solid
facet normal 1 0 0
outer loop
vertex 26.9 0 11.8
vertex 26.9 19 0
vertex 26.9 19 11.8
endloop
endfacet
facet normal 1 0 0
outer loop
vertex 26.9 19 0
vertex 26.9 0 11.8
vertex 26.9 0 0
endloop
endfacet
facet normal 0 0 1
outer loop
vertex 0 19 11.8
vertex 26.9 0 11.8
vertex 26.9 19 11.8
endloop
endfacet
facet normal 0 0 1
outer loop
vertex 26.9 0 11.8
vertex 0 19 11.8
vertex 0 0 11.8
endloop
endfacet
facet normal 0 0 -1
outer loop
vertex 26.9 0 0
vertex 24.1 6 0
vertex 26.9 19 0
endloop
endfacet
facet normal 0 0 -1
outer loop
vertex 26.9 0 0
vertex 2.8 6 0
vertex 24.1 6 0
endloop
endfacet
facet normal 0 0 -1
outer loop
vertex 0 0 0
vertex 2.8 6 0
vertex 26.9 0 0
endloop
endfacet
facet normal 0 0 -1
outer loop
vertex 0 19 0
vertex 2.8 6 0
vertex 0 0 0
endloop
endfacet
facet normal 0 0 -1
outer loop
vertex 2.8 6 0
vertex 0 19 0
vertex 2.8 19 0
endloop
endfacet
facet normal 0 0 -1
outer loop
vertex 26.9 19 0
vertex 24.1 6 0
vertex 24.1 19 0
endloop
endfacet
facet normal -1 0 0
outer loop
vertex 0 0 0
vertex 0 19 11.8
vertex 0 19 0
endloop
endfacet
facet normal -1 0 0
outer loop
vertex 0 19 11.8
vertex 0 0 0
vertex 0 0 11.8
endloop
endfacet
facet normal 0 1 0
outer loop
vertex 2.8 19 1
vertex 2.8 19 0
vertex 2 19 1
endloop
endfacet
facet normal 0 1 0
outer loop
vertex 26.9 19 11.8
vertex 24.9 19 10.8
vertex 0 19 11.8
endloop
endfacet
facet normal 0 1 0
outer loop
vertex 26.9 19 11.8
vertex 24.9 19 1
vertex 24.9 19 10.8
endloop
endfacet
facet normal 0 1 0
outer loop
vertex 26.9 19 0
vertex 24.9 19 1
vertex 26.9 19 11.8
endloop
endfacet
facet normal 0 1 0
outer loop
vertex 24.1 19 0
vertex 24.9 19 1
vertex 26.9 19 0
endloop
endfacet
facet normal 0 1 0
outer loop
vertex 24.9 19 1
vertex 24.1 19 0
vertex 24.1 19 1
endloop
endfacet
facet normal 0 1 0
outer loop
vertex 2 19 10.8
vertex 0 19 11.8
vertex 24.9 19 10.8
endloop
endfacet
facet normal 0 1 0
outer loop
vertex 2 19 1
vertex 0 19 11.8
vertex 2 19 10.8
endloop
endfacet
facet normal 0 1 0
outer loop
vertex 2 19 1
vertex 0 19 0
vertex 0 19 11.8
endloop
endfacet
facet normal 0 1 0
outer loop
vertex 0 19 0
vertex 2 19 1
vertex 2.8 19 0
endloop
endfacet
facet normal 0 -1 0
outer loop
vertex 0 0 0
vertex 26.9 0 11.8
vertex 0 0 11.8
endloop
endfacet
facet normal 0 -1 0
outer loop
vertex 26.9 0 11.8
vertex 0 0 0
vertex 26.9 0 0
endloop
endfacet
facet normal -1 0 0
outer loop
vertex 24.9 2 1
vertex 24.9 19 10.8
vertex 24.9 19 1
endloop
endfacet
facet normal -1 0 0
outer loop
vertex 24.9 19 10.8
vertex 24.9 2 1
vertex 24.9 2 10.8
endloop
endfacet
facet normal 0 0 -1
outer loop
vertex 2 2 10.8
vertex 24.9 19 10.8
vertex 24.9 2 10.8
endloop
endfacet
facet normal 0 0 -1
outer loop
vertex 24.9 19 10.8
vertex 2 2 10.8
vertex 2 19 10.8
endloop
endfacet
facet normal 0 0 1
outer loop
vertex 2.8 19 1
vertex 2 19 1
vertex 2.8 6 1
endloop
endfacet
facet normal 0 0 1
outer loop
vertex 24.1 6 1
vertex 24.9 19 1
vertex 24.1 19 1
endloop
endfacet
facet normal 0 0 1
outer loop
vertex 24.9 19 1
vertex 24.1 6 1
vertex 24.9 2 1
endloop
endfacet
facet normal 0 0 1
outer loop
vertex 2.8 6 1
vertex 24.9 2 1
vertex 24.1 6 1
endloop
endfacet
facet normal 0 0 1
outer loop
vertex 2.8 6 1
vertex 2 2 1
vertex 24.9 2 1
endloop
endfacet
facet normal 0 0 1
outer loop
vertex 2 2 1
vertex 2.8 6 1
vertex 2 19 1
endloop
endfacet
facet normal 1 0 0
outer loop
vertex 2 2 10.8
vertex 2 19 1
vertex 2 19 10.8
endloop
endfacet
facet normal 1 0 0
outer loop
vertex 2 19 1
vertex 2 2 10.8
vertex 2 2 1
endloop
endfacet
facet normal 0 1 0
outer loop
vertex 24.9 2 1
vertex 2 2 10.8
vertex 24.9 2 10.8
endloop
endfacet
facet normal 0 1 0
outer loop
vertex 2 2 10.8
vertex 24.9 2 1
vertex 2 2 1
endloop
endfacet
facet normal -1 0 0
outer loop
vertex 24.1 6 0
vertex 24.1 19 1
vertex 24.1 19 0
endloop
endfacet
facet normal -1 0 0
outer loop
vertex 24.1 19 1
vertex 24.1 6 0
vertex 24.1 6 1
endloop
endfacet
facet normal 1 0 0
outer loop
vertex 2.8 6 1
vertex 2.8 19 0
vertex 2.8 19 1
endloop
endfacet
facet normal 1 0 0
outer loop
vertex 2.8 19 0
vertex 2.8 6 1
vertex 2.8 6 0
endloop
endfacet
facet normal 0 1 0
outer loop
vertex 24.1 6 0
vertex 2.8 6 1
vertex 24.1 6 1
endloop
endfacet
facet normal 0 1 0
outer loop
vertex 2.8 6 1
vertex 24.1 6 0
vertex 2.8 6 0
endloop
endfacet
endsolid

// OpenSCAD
// file: pcb-model-sizes.scad
pcbSmtLvSize=[65.94, 33.75];
pcbDevkitcRelaySize=[57.53, 31.88];
pcbCurrentSensorSize=[43.5, 35];
pcbCurrentSensorMiniSize=[39, 35];
pcbCurrentSensorMiniPadDepth=15;
pcbContactorPsuSize=[44.1, 24.4];
pcbContactorInterfaceRelaySize=[41.3,34.8];

pcbRelayHeight = 18.5;
pcbTallCompoent = 15;
pcbShortComponent = 6;

pcbThickness = 1.6;
solderThickness = 3;
wallThickness = 1.5;
partitionThickness = 0.8;

caseMargin = 0.2;
// file: relay-current-enclosure.scad
include <pcb-model-sizes.scad>

currentTopStands=[6, 28];
currentBottomStands = [7, 27];
relayTopStands=[9, 42];
relayBottomStands = [12, 41];
standSize = 2;

module relayCurrentCase(legHeight=5) {
    maxY = max(pcbCurrentSensorSize[1], pcbDevkitcRelaySize[1]);
    sizeX = 2 * wallThickness + partitionThickness + pcbDevkitcRelaySize[0] + pcbCurrentSensorSize[0];
    relayYOffset = (maxY - pcbDevkitcRelaySize[1]) / 2;
    difference() {
        cube([sizeX, 2 * wallThickness + maxY, wallThickness + pcbThickness + solderThickness]);
        translate([wallThickness - caseMargin, wallThickness + relayYOffset - caseMargin, wallThickness]) {
            cube([pcbDevkitcRelaySize[0] + 2 * caseMargin, pcbDevkitcRelaySize[1] + 2 * caseMargin, pcbThickness + solderThickness + 0.01]);
        }
        translate([wallThickness + pcbDevkitcRelaySize[0] + partitionThickness, wallThickness + (maxY - pcbCurrentSensorSize[1]) / 2, wallThickness]) {
            cube([pcbCurrentSensorSize[0], pcbCurrentSensorSize[1], pcbThickness + solderThickness + 0.01]);
        }
    }
    translate([wallThickness,wallThickness + relayYOffset,wallThickness]) {
        for(stand = relayBottomStands) {
            translate([stand, 0, 0]){
               cube([standSize, standSize, solderThickness]);
            }
        }
    }

    translate([wallThickness,wallThickness + relayYOffset + pcbDevkitcRelaySize[1] - standSize,wallThickness]) {
        for(stand = relayTopStands) {
            translate([stand, 0, 0]){
               cube([standSize, standSize, solderThickness]);
            }
        }
    }

    translate([wallThickness + pcbDevkitcRelaySize[0] + partitionThickness,wallThickness,wallThickness]) {
        for(stand = currentBottomStands) {
            translate([stand, 0, 0]){
               cube([standSize, standSize, solderThickness]);
            }
        }
    }

    translate([wallThickness + pcbDevkitcRelaySize[0] + partitionThickness,wallThickness + pcbCurrentSensorSize[1] - standSize,wallThickness]) {
        for(stand = currentTopStands) {
            translate([stand, 0, 0]){
               cube([standSize, standSize, solderThickness]);
            }
        }
    }

    translate([0, 0, wallThickness + pcbThickness + solderThickness - 0.01]) {
        translate([wallThickness + caseMargin, 0, 0]) {
            cube([1 * wallThickness, wallThickness, 2 * wallThickness]);
        }

        translate([sizeX - wallThickness - caseMargin - 1 * wallThickness, 0, 0]) {
            cube([1 * wallThickness, wallThickness, 2 * wallThickness]);
        }

        translate([wallThickness + caseMargin, maxY + wallThickness, 0]) {
            cube([2 * wallThickness, wallThickness, 2 * wallThickness]);
        }

        translate([sizeX - wallThickness - caseMargin - 2 * wallThickness, maxY + wallThickness, 0]) {
            cube([2 * wallThickness, wallThickness, 2 * wallThickness]);
        }
    }

    if (legHeight > 0) {
        translate([0,0,-legHeight + 0.01]) {
            cube([10 * wallThickness, 2 * wallThickness + maxY, legHeight]);
        }
        translate([sizeX - 10 * wallThickness, 0, -legHeight + 0.01]) {
            cube([10 * wallThickness, 2 * wallThickness + maxY, legHeight]);
        }
    }
}

module relayCurrentCaseTop() {
    maxY = max(pcbCurrentSensorSize[1], pcbDevkitcRelaySize[1]);
    trayHeight = wallThickness + pcbThickness + solderThickness;

    difference() {
        cube([2 * wallThickness + partitionThickness + pcbDevkitcRelaySize[0] + pcbCurrentSensorSize[0], 4 * wallThickness + maxY, wallThickness + pcbThickness + solderThickness + pcbRelayHeight + wallThickness]);
        translate([-0.01, wallThickness - caseMargin, -0.01]) {
            cube([2 * wallThickness + partitionThickness + pcbDevkitcRelaySize[0] + pcbCurrentSensorSize[0] + 0.02, 2 * wallThickness + maxY + 2 * caseMargin, wallThickness + pcbThickness + solderThickness]);
        }
        translate([wallThickness -0.01, wallThickness, wallThickness + pcbThickness + solderThickness - 0.01]) {
            cube([partitionThickness + pcbDevkitcRelaySize[0] + pcbCurrentSensorSize[0] + 0.02, 2 * wallThickness + maxY, pcbRelayHeight + 0.01]);
        }
        for(hole=[[6,6], [33, 6], [51, 6], [pcbDevkitcRelaySize[0] + partitionThickness + 15.5, 6], [pcbDevkitcRelaySize[0] + partitionThickness + 39, 6]]) {
            translate([wallThickness + hole[0] - hole[1] / 2, - 0.01, 0]) {
                cube([hole[1], wallThickness + 0.02, trayHeight + hole[1]]);
            }
        }
        for(hole=[[16,6], [46, 4], [pcbDevkitcRelaySize[0] + partitionThickness + 28.5, 6]]) {
            translate([wallThickness + hole[0] - hole[1] / 2, 3 * wallThickness + maxY - 0.01, 0]) {
                cube([hole[1], wallThickness + 0.02, trayHeight + hole[1]]);
            }
        }
    }
}

module smtLvSled() {
    maxY = max(pcbCurrentSensorSize[1], pcbDevkitcRelaySize[1]);

    offsetY = maxY + (2 * wallThickness) - (pcbSmtLvSize[1] + 2 * wallThickness);

    difference() {
        union() {
            translate([0, 0, 0]) {
                cube([pcbSmtLvSize[0] + 2 * wallThickness, pcbSmtLvSize[1] + 2 * wallThickness, wallThickness + pcbTallCompoent + pcbThickness]);
            }
        }
        translate([wallThickness, 1 * wallThickness, wallThickness]) {
            cube([pcbSmtLvSize[0], pcbSmtLvSize[1] + 0 * wallThickness + 0.01, pcbTallCompoent + pcbThickness + 0.01]);
        }

        translate([wallThickness, wallThickness, pcbTallCompoent / 2]) {
            cube([pcbSmtLvSize[0], pcbSmtLvSize[1] + wallThickness + 0.01, pcbTallCompoent / 2 + pcbThickness + wallThickness + 0.01]);
        }
    }
    translate([pcbSmtLvSize[0] / 4 - wallThickness, wallThickness, wallThickness]) {
        cube([wallThickness * 2, wallThickness * 3, pcbTallCompoent]);
    }
    translate([ 3 * pcbSmtLvSize[0] / 4 - wallThickness, wallThickness, wallThickness]) {
        cube([wallThickness * 2, wallThickness * 3, pcbTallCompoent]);
    }

    translate([pcbSmtLvSize[0] / 4 - wallThickness, wallThickness, wallThickness]) {
        cube([wallThickness * 2, wallThickness * 3, pcbTallCompoent]);
    }
    translate([ 3 * pcbSmtLvSize[0] / 4 - wallThickness, wallThickness, wallThickness]) {
        cube([wallThickness * 2, wallThickness * 3, pcbTallCompoent]);
    }

    translate([pcbSmtLvSize[0] / 4 - wallThickness, wallThickness + pcbSmtLvSize[1] - wallThickness * 1, wallThickness]) {
        #cube([wallThickness * 2, wallThickness * 2, pcbTallCompoent]);
    }

    translate([3 * pcbSmtLvSize[0] / 4 - wallThickness, wallThickness + pcbSmtLvSize[1] - wallThickness * 1, wallThickness]) {
        #cube([wallThickness * 2, wallThickness * 2, pcbTallCompoent]);
    }

    translate([0, -offsetY - 1.4, 0]) {
        cube([pcbSmtLvSize[0] + 2 * wallThickness, maxY + 4 * wallThickness + 2.8, wallThickness]);
    }

    translate([0, -offsetY - 1.4 - wallThickness, -3 * wallThickness]) {
        cube([pcbSmtLvSize[0] + 2 * wallThickness, wallThickness, 4 * wallThickness]);
    }

    translate([0, maxY + 3 * wallThickness + 1.4, -3 * wallThickness]) {
        cube([pcbSmtLvSize[0] + 2 * wallThickness, wallThickness, 4 * wallThickness]);
    }

}

relayCurrentCase();


translate([0, -wallThickness, wallThickness + pcbThickness + solderThickness + 2]) {
    relayCurrentCaseTop();
}

translate([0, 0, 15 + pcbRelayHeight + wallThickness]) {
    *smtLvSled();
}
// file: pcb-models.scad
module pcbDevkitcRelay() {
    rotate([-90, 0, 0]) {
        scale(1000) {
            import("pcb-models/access-control-devkitc-relay.stl");
        }
    }
}

module pcbDevkitcPsu() {
    rotate([-90, 0, 0]) {
        scale(1000) {
            import("pcb-models/access-control-devkitc-relay.stl");
        }
    }
}

module pcbCurrentSensor() {
    rotate([-90, 0, 0]) {
        scale(1000) {
            import("pcb-models/current-sensor-pcb.stl");
        }
    }
}

module pcbSmtLv() {
    rotate([-90, 0, 0]) {
        scale(1000) {
            import("pcb-models/access-control-smt-lv.stl");
        }
    }
}

module pcbContactorPsu() {
    rotate([-90, 0, 0]) {
        scale(1) {
            import("pcb-models/contactor-psu.stl");
        }
    }
}
// file: contactor-interface-smt-221-615.scad
fullContactorWidth=45; /*45.3*/
centerWingWidth=18;
centerInnerWingWidth=14;
centerInnerGap=9; /*8.9*/
centerOuterGap=22;
centerToPortEdge = centerOuterGap;
centerWingWall=2.25;
centerWingDepth=10.5;
centerWingSlotDepth=7;
centerToFarEdge = 19;
slotGap = 0.15;
pcbWidth=50;
pcbLength=66;
zeroOffsetToContactorCenter=-5;
pcbWallWidth=2;
pcbClearance=0.5;
pcbClearanceTop=1;
sideWidth = (fullContactorWidth - centerOuterGap) / 2 - centerWingWall;
gapWidth = fullContactorWidth / 2 - sideWidth;
verticalSupportWidth = 20;

wago221s615 = [36.3, 21.0 - 4, 9.8];
wago221s613 = [22.9, 21.0 - 4, 9.8];
wagoWallWidthH = 1;
wagoWallWidthV = 2;
wagoWireD = 6;
wagoLeaverOffset = 4;
wagoInterallWall = 0.8;

psuHeight = 3 * wagoWallWidthH + 3 * wago221s615[2];/*22.5*/

use <pcb-models.scad>
use <relay-current-enclosure.scad>
include <pcb-model-sizes.scad>

module contactorInterfaceSMT615() {

    difference() {
        translate([-fullContactorWidth / 2, 0, 0]) {
            union() {
                sideWidth = (fullContactorWidth - centerOuterGap) / 2 - centerWingWall;
                cube([fullContactorWidth, centerToFarEdge / 2 + 3, 2 * centerWingWall]);
            }
        }
        translate([-centerInnerGap / 2 - centerWingWall - slotGap, 0, 0]) {
            cube([centerWingWall + slotGap, centerWingDepth, centerWingWall]);
        }

        translate([-centerInnerGap / 2 - 2 * centerWingWall, 0, 0]) {
            cube([centerWingWall, centerWingWall, centerWingWall]);
        }

        translate([centerInnerGap / 2, 0, 0]) {
            cube([centerWingWall + slotGap, centerWingDepth, centerWingWall]);
        }

        translate([centerInnerGap / 2 + 1 * centerWingWall, 0, 0]) {
            cube([centerWingWall, centerWingWall, centerWingWall]);
        }

        translate([-centerInnerGap / 2 - (centerWingWall * 2), 0, centerWingWall]) {
            cube([2 * centerWingWall, centerWingDepth, centerWingWall]);
        }

        translate([centerInnerGap / 2 - (centerWingWall * 0), 0, centerWingWall]) {
            cube([2 * centerWingWall, centerWingDepth, centerWingWall]);
        }
    }

    halfWidthNotWago = (pcbWidth - wago221s615[0] - 2 * wagoWallWidthV)/2;

    translate([fullContactorWidth / 2 + pcbWallWidth - (wago221s615[0] + 2 * wagoWallWidthV), pcbLength / 2 + zeroOffsetToContactorCenter - (wago221s615[1] + wagoWallWidthV) + pcbWallWidth, /*centerWingWall * 2 + pcbClearance*/]){
        wagoPort615();
        translate([0, 0, wagoWallWidthH + wago221s615[2]]) {
            wagoPort615();
        }
        translate([0, 0, 2 * wagoWallWidthH + 2 * wago221s615[2]]) {
            wagoPort615();
        }
    }

    translate([fullContactorWidth / 2 + pcbWallWidth - pcbThickness - solderThickness - wallThickness , zeroOffsetToContactorCenter + pcbLength / 2 + 1 * pcbWallWidth - wago221s615[1] - 3 * wagoWallWidthH - pcbCurrentSensorSize[0] - pcbContactorPsuSize[0] - 2 * wallThickness - partitionThickness + 2.5, 0]) {
        maxOuterSize = 2 * wallThickness + max(pcbCurrentSensorSize[1], pcbContactorPsuSize[1]) + centerWingWall * 2 + 1 * pcbClearance + wagoWallWidthV;
        difference() {
            cube([pcbThickness + solderThickness + wallThickness, pcbCurrentSensorSize[0] + pcbContactorPsuSize[0] + 2 * wallThickness + partitionThickness + 0, maxOuterSize]);
            translate([-0.01, wallThickness, centerWingWall * 2 + 1 * pcbClearance + 0.5 + wagoWallWidthV]) {
                cube([pcbThickness + solderThickness, pcbCurrentSensorSize[0], pcbCurrentSensorSize[1]]);
            }

            translate([-0.01, wallThickness + pcbCurrentSensorSize[0] + partitionThickness,centerWingWall * 2 + 1 * pcbClearance + 0.5 + wagoWallWidthV]) {
                cube([pcbThickness + solderThickness, pcbContactorPsuSize[0], pcbContactorPsuSize[1]]);
            }
        }

        translate([-wago221s615[2] - 2 * wagoWallWidthH - wago221s615[2], wago221s615[1] + 1.5 * wagoWireD + wallThickness , 2 * centerWingWall + wagoWallWidthH + 0.5]) {

            rotate([180, -90, 0]) { 
                wagoPort613(true);
            }

            translate([0,0,(maxOuterSize - (2 * centerWingWall + wagoWallWidthH)) -  wago221s613[0]]) {
                rotate([180, -90, 0]) { 
                    #wagoPort613(true);
                }
            }

            translate([wago221s615[2] + 2 * wagoWallWidthH, -wago221s615[1] - wagoWallWidthV, 0]) {
                cube([wago221s615[2], wago221s615[1] + wagoWallWidthV, wallThickness]);

                translate([-wagoWallWidthH, 0, 0]) {
                    cube([wagoWallWidthH, wago221s615[1] + wagoWallWidthV, maxOuterSize - (2 * centerWingWall + wagoWallWidthH) - 0.5]);
                }

                translate([0, 0, (maxOuterSize - (2 * centerWingWall + wagoWallWidthH)) - wagoWallWidthV]) {
                    cube([wago221s615[2], wago221s615[1] + wagoWallWidthV, wallThickness]);
                }
            }
        }

    }


    *translate([fullContactorWidth / 2 - solderThickness,-14,pcbCurrentSensorSize[1] + centerWingWall * 2 + 2 * pcbClearance + wagoWallWidthV]) {
        rotate([90, 0, 0]) {
            rotate([0,-90, 0]) {
                color("green") pcbCurrentSensor();
            }
        }
    }

    *translate([fullContactorWidth / 2 - solderThickness,11, centerWingWall * 2 + 2 * pcbClearance + wagoWallWidthV]) {
        psuVertical();
    }
}

module psuVertical() {
    translate([-1.0,7.5,0]) {
        rotate([0, 0, 0]) {
            rotate([0,-90, 0]) {
                color("green") pcbContactorPsu();
            }
        }
    }
}


module wagoPort615() {  
    difference(){
        cube([wago221s615[0] + 2 * wagoWallWidthV, wago221s615[1] + wagoWallWidthV, wago221s615[2] + 2 * wagoWallWidthH]);
        translate([wagoWallWidthV, wagoWallWidthV, wagoWallWidthH]) {
            cube([wago221s615[0], wago221s615[1] + 0.01, wago221s615[2]]);
        }
    }
}

module wagoPort613(open=false) {  
    difference(){
        cube([wago221s613[0] + 2 * wagoWallWidthV, wago221s613[1] + wagoWallWidthV, wago221s613[2] + 2 * wagoWallWidthH]);
        translate([wagoWallWidthV, wagoWallWidthV, wagoWallWidthH]) {
            cube([wago221s613[0], wago221s613[1] + 0.01, wago221s613[2]]);
        }

        if (open) {
            translate([wagoWallWidthV + wagoInterallWall,wagoWallWidthV + wagoLeaverOffset,-0.01]) {
                cube([wago221s613[0] - 2 * wagoInterallWall, wago221s613[1] - wagoLeaverOffset + 0.01, wagoWallWidthH + 0.02]);
            }
        }
    }
}

module maxWidthPort() {
    difference() {
        cube([pcbWallWidth * 2 + pcbWidth, wago221s615[1] + pcbWallWidth, wago221s615[2] + 2 * pcbWallWidth]);
        translate([pcbWallWidth, -0.01, pcbWallWidth]) {
            cube([pcbWidth, wago221s615[1] + 0.01, wago221s615[2]]);
        }
    }
}


contactorInterfaceSMT615();
// main file
use <contactor-interface-smt-221-615.scad>

wagoPort613(true);
